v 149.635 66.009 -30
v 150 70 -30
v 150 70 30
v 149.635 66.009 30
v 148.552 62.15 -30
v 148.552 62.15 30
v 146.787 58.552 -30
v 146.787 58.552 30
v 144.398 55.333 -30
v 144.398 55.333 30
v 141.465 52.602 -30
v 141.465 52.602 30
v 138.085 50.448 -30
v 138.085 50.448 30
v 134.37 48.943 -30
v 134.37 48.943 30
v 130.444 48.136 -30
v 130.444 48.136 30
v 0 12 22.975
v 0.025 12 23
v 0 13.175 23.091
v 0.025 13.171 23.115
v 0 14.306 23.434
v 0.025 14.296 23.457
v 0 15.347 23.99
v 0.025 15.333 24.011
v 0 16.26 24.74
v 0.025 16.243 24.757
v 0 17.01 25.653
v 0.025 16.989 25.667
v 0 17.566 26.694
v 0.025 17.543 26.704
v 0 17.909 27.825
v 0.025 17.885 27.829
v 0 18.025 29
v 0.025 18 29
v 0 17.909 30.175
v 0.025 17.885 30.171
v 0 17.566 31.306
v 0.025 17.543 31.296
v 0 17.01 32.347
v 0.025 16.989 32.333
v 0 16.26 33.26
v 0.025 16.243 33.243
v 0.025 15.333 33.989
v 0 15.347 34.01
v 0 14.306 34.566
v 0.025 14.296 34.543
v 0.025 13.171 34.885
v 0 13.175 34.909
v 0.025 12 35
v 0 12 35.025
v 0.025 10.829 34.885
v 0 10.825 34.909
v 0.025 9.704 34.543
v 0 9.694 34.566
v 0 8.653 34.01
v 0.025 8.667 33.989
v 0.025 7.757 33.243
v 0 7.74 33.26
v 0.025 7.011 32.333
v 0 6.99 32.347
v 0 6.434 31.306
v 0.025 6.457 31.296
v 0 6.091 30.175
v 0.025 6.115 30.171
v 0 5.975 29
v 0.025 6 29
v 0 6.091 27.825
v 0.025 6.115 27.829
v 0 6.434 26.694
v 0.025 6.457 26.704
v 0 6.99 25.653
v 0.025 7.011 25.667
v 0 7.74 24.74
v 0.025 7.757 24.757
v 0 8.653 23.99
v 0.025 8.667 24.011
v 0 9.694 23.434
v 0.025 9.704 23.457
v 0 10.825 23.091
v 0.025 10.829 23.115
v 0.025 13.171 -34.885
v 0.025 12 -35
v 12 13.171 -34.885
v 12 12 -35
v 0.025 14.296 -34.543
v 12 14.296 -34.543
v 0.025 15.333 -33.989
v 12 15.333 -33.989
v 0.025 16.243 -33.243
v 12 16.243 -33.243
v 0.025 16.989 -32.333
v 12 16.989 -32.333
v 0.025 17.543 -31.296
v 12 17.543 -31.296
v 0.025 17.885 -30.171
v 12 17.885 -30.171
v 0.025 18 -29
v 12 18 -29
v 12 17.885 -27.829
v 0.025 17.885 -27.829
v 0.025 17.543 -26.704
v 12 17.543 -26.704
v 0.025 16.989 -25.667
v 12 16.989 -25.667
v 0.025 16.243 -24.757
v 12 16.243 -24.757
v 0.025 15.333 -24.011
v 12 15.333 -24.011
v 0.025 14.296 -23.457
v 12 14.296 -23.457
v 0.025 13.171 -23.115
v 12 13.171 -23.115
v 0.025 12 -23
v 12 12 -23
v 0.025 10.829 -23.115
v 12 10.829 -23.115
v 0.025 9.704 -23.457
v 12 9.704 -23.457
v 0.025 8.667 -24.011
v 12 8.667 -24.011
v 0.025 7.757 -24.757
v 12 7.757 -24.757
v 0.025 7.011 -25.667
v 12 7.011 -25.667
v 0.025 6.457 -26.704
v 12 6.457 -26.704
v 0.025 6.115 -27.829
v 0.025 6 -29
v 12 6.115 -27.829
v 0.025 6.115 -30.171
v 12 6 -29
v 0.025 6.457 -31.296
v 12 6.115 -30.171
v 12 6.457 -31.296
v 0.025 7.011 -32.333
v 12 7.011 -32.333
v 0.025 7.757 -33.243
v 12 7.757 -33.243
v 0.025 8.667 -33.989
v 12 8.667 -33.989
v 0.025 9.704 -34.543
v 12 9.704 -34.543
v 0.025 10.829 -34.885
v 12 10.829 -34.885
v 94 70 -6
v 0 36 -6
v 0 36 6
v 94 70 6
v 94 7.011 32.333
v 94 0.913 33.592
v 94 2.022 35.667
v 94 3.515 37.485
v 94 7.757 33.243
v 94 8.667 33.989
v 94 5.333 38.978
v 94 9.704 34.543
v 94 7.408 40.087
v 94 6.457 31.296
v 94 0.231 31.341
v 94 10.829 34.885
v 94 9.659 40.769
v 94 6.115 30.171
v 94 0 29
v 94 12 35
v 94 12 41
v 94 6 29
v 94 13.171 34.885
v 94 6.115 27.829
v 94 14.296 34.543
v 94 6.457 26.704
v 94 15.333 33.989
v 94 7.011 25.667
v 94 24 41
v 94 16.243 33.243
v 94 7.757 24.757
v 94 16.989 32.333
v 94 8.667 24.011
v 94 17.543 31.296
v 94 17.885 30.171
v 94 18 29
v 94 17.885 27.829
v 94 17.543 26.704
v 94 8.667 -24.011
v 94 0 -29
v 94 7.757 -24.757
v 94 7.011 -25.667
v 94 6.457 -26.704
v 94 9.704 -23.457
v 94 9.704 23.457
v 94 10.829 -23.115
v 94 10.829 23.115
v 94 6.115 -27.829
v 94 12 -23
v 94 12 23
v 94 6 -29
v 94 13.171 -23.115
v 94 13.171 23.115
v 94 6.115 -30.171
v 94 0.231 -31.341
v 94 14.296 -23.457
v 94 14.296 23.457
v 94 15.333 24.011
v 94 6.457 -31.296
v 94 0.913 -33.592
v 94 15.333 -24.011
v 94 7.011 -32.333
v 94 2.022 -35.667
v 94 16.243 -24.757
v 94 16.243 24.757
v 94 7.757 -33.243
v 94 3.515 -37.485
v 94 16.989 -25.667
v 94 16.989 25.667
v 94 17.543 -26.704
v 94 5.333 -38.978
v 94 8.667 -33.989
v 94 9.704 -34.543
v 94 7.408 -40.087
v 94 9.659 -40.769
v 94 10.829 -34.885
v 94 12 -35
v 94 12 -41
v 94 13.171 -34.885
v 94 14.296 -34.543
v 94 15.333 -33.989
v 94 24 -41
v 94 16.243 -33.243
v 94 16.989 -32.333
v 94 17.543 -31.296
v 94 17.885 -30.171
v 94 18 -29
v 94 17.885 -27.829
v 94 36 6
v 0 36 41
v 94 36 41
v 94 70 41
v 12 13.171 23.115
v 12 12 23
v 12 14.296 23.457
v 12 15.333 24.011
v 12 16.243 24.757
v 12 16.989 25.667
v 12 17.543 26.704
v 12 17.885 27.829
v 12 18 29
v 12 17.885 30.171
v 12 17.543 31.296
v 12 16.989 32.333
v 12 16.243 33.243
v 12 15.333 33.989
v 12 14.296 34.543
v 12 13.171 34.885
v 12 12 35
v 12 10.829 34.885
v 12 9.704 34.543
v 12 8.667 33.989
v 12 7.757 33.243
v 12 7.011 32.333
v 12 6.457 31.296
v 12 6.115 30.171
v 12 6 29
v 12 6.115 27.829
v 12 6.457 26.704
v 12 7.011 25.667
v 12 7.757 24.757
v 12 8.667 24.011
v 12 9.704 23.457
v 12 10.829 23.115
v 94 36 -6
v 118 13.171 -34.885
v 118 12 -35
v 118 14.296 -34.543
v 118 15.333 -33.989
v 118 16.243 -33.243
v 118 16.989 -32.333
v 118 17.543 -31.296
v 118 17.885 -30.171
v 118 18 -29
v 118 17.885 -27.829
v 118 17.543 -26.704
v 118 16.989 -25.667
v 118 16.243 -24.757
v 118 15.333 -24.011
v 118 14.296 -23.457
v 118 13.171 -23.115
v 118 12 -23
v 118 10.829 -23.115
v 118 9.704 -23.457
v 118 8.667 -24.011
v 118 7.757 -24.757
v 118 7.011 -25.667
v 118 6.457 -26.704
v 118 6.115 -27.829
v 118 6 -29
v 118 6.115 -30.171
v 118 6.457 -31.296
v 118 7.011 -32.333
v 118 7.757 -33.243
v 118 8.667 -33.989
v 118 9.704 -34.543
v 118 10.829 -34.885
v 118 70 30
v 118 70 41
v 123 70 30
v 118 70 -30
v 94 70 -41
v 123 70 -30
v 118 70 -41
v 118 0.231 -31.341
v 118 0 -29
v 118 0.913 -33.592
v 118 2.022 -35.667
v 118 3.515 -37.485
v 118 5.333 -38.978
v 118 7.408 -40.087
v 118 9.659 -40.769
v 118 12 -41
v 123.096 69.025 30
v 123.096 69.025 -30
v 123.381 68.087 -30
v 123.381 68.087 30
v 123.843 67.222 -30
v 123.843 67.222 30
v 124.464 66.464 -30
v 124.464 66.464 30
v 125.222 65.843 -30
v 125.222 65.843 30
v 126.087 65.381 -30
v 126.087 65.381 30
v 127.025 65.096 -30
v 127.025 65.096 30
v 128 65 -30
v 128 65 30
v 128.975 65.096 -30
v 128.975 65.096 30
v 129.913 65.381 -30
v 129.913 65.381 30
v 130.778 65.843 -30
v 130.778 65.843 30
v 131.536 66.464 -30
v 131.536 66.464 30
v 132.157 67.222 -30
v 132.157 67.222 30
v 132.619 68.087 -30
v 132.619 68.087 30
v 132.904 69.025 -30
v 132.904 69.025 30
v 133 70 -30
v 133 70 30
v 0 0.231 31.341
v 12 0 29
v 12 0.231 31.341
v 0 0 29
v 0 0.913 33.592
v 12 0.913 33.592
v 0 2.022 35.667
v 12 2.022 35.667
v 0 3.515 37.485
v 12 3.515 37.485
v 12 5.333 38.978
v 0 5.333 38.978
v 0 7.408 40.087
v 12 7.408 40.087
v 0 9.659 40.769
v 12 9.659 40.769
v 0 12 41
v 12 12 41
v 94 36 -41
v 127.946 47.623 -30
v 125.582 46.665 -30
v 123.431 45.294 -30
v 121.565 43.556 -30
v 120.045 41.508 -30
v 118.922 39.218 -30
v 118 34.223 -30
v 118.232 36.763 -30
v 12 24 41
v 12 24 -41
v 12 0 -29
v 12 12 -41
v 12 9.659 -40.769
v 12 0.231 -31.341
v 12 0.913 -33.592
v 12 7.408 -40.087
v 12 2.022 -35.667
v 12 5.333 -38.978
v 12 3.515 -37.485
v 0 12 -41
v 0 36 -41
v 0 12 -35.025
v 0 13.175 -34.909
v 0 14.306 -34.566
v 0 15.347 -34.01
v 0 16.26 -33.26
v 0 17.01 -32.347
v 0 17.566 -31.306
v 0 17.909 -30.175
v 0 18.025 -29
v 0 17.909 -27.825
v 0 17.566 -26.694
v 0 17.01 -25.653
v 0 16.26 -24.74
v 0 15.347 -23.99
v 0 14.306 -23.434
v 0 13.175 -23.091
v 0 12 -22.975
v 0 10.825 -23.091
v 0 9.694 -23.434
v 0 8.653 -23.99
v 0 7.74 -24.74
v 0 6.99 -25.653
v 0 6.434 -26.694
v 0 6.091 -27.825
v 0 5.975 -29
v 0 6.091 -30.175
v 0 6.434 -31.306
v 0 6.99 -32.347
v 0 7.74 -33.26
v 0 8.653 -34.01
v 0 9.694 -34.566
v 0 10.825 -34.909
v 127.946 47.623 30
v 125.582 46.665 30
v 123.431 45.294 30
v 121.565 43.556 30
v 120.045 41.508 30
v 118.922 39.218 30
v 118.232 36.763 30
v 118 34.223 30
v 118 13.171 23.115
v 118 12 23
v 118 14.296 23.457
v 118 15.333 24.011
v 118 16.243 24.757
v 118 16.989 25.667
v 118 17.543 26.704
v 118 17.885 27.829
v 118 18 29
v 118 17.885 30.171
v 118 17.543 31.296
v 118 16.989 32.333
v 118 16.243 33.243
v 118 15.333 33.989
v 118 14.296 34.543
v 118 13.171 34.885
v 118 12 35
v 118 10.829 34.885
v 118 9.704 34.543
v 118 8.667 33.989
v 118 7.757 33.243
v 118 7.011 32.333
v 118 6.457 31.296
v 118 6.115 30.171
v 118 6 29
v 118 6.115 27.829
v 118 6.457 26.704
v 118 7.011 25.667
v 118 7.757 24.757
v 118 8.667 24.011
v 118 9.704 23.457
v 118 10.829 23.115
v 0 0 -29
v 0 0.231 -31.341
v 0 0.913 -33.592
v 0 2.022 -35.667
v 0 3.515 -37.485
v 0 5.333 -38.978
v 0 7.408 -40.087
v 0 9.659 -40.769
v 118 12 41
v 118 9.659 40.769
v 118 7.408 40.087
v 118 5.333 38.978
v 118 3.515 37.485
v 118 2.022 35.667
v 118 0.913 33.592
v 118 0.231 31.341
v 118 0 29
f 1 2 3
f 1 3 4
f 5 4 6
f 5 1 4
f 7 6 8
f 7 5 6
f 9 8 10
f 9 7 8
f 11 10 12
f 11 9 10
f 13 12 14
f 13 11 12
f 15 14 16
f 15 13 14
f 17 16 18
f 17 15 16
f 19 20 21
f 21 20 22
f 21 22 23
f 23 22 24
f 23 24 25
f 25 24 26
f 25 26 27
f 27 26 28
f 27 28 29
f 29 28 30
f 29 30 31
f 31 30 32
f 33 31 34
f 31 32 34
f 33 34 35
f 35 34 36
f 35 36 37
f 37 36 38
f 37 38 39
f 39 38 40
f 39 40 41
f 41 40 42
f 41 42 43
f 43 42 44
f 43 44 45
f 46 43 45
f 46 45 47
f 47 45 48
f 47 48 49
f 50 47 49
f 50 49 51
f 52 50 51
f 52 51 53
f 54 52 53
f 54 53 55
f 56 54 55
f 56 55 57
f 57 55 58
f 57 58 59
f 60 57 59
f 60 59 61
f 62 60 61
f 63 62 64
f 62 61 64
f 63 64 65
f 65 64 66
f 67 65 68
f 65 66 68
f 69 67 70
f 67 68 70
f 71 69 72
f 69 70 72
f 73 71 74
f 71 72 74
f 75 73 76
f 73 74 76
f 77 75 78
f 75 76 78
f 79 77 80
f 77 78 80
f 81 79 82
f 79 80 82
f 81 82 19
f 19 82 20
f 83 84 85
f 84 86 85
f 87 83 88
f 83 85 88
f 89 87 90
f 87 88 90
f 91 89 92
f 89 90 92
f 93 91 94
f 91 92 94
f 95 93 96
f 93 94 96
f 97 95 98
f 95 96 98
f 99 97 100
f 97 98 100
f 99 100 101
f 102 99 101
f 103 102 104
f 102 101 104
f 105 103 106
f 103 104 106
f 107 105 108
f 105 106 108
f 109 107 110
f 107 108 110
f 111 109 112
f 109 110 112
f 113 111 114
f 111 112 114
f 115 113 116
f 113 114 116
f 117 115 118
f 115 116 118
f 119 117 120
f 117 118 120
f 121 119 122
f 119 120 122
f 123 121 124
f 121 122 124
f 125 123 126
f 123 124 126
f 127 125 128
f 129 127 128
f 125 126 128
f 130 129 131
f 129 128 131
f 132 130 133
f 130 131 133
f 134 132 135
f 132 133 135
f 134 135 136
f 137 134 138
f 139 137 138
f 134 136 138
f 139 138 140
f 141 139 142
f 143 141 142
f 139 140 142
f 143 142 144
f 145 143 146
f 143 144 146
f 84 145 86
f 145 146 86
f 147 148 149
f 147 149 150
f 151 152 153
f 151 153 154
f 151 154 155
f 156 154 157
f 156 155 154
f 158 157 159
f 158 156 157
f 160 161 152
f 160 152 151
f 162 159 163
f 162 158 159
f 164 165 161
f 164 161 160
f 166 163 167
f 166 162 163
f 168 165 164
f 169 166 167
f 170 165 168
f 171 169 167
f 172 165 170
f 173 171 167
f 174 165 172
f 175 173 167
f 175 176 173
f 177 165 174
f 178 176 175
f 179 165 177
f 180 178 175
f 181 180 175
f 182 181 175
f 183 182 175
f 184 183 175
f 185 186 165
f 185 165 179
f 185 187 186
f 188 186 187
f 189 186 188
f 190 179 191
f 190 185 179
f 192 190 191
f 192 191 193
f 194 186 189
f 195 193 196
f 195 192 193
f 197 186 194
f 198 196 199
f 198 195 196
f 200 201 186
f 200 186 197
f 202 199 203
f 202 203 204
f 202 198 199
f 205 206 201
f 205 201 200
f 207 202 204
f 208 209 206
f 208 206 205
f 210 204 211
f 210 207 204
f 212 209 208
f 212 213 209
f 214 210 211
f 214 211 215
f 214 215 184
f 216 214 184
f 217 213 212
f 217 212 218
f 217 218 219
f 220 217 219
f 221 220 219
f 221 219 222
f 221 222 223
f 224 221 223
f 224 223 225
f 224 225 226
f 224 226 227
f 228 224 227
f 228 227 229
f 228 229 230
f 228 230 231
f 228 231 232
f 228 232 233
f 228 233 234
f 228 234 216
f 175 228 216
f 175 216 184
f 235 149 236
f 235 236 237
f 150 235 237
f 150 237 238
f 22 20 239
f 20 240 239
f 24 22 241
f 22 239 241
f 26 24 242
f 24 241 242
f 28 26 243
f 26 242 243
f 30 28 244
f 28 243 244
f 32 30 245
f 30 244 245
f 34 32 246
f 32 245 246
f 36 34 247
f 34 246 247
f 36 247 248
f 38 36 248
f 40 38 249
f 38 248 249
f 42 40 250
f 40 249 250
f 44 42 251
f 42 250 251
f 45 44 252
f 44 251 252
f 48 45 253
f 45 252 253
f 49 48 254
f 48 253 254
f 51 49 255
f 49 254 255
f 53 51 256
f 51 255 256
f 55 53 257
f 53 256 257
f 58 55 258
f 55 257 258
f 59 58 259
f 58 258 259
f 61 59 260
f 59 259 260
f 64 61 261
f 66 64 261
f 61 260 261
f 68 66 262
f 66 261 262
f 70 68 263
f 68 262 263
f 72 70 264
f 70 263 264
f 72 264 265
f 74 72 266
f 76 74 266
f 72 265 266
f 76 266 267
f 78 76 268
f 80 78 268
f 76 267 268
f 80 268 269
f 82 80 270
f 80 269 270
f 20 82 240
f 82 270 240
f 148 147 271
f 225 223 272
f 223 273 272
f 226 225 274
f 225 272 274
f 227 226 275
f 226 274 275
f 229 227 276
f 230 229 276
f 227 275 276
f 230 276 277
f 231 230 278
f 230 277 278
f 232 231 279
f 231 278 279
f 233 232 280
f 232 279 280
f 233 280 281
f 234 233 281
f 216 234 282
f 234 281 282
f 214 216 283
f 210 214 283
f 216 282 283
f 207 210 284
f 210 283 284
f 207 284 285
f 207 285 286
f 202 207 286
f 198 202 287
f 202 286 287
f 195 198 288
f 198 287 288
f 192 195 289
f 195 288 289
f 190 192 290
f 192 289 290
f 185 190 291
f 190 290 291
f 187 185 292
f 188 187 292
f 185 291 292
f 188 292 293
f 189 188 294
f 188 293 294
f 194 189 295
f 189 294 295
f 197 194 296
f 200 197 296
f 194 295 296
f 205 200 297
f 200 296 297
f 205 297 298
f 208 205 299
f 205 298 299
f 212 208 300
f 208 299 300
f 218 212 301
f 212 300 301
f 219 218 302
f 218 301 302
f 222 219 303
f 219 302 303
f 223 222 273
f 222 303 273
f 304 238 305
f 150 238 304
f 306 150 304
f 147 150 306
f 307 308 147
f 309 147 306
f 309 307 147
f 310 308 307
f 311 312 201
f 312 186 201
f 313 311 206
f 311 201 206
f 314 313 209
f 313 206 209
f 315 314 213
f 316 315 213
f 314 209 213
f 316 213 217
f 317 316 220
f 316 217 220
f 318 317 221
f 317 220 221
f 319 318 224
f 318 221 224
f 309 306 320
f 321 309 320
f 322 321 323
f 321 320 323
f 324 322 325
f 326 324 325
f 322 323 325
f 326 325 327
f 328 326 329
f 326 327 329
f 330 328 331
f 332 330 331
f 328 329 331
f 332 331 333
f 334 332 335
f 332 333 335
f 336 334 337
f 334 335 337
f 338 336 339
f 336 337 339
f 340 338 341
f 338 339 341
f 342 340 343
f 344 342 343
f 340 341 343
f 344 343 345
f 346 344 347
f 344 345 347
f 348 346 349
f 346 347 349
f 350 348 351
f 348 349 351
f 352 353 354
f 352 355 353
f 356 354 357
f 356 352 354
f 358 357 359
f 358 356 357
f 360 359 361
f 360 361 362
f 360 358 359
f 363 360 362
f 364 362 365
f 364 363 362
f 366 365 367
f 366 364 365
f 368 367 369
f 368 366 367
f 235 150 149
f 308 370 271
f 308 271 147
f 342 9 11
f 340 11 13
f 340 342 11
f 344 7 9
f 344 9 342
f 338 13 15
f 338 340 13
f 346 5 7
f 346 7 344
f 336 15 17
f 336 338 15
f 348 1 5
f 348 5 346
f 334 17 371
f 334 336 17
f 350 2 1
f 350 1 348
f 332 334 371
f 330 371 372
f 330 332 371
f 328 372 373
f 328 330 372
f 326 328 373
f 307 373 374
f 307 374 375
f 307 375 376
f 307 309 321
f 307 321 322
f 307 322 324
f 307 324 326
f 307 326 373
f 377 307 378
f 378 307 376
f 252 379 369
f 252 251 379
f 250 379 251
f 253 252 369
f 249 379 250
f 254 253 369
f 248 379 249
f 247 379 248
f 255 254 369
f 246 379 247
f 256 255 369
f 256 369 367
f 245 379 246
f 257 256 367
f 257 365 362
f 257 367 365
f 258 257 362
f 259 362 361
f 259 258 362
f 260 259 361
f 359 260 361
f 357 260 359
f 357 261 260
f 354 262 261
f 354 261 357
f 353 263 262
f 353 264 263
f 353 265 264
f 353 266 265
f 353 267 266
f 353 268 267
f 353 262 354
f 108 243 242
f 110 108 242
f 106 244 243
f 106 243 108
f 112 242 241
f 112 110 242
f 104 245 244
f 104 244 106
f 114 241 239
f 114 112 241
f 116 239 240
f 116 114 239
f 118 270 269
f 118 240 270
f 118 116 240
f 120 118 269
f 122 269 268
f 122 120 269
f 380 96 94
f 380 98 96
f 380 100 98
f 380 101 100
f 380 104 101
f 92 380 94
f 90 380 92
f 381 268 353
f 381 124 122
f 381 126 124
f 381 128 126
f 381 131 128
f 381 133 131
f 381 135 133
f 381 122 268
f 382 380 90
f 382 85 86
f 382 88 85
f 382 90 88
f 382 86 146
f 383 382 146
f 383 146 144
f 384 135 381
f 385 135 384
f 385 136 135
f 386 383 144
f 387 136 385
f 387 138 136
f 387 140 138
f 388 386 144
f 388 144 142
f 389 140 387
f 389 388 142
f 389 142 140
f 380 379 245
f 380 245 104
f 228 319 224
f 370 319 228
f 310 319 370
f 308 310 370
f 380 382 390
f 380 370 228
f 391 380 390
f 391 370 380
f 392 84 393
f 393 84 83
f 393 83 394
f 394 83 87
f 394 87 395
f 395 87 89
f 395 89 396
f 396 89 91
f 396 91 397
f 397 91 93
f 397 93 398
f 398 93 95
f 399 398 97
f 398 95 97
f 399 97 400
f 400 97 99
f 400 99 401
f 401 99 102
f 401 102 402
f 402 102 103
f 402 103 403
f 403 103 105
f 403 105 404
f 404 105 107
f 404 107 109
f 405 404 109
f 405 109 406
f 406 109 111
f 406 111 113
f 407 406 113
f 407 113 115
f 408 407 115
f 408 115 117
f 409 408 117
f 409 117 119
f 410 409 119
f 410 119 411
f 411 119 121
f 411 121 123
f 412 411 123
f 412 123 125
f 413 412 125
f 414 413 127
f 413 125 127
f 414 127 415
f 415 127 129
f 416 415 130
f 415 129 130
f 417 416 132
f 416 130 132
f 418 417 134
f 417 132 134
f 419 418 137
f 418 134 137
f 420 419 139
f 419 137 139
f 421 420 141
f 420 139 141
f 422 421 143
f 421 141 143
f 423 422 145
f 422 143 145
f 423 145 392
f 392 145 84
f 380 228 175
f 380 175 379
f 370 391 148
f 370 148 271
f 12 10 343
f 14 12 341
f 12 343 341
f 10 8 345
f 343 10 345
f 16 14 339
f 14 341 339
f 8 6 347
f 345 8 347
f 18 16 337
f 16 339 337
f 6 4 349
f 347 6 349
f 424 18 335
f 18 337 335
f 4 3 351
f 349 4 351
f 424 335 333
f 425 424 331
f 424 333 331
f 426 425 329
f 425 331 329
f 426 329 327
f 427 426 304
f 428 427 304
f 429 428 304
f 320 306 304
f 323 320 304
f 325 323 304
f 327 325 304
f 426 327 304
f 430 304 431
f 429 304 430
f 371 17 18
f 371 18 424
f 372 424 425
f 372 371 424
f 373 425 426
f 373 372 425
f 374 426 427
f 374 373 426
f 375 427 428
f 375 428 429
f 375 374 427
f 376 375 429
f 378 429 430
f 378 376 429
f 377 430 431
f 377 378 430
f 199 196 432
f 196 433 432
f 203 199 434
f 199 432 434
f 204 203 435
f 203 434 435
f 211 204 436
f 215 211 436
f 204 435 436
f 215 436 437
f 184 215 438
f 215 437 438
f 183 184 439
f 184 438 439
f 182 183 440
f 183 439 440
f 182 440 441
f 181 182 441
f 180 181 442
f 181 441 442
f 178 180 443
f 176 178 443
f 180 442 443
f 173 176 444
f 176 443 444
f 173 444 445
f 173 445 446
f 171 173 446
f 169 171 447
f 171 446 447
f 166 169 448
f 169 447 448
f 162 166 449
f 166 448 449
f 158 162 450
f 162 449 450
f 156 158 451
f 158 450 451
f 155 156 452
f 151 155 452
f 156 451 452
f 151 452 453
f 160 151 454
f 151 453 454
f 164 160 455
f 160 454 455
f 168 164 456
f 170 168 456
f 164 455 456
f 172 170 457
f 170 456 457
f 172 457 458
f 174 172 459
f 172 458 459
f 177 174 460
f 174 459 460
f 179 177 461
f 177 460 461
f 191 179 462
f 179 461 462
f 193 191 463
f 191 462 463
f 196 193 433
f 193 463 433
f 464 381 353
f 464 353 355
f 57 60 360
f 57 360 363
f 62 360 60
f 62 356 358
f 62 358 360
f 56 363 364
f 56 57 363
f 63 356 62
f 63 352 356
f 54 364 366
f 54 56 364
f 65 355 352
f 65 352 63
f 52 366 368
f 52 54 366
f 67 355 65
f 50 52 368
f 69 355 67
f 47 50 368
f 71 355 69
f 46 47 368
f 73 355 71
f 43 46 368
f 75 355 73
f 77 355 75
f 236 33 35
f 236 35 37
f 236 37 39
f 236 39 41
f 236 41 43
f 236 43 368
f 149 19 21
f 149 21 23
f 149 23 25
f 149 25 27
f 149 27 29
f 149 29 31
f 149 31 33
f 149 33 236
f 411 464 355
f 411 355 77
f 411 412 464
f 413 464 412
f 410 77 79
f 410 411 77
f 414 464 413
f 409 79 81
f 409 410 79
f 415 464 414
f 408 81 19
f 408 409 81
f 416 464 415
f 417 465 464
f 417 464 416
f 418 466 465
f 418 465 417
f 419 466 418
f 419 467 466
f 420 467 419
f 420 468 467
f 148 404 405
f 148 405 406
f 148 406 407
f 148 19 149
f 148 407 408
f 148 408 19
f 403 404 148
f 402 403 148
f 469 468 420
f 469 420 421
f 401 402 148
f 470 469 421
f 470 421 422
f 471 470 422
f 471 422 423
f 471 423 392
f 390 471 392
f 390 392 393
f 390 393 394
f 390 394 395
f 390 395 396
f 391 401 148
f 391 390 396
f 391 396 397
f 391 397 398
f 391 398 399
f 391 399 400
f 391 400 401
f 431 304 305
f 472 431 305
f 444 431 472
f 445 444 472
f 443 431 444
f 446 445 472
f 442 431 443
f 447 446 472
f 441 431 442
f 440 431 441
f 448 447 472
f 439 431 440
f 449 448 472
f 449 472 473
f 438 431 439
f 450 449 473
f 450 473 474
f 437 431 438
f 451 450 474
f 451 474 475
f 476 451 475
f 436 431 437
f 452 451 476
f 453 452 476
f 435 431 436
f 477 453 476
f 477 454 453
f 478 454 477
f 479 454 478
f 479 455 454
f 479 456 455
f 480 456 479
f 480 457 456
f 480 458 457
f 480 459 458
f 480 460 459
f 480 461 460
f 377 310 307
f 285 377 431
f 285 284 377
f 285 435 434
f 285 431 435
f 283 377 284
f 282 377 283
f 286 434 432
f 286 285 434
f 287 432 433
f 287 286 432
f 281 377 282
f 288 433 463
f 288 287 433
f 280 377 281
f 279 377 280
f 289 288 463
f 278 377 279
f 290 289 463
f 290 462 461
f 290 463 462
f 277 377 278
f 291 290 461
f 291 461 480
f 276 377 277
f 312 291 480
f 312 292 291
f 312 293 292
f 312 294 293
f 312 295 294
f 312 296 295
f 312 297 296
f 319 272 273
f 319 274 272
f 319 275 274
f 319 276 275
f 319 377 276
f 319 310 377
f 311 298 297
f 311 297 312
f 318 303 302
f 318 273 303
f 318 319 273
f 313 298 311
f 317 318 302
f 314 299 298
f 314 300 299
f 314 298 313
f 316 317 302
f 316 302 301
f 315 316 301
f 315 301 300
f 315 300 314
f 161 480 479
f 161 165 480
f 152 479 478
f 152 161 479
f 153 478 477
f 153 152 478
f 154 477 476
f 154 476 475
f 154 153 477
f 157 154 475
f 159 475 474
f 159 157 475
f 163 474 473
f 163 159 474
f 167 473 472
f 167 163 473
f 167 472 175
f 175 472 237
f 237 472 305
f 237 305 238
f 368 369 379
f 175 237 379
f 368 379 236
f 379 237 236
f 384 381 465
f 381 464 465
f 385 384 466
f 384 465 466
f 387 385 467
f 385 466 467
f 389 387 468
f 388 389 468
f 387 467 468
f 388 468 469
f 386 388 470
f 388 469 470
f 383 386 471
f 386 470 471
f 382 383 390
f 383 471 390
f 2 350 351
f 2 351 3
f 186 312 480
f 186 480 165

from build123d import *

# Parameters (mm, degrees)
BOSS_EXTRUDE1_DEPTH              = 41
BOSS_EXTRUDE1_DEPTH_BACK         = 41
FILLET1_R                        = 12
F_12_0MM_DOWEL_HOLE1_D           = 12
F_12_0MM_DOWEL_HOLE1_CSINK_D     = 12.05
F_12_0MM_DOWEL_HOLE1_CSINK_ANGLE = 90
BOSS_EXTRUDE2_DEPTH              = 30
BOSS_EXTRUDE2_DEPTH_BACK         = 30
SKETCH8_R                        = 5
CUT_EXTRUDE1_DEPTH               = 181.113852882
BOSS_EXTRUDE3_DEPTH              = 6
BOSS_EXTRUDE3_DEPTH_BACK         = 6


with BuildPart() as part:
    # Sketch1 → Boss-Extrude1 (new, two sides: drawn at the far end of the back side and taken through both)
    with BuildSketch(Plane.XY.offset(-BOSS_EXTRUDE1_DEPTH_BACK)):
        Polygon((0, 0), (0, 36), (94, 36), (94, 70), (118, 70), (118, 0), (94, 0), (94, 24), (12, 24), (12, 0), align=None)
    extrude(amount=BOSS_EXTRUDE1_DEPTH + BOSS_EXTRUDE1_DEPTH_BACK)

    # Fillet1
    fillet1_edges = [part.edges().sort_by_distance(p)[0] for p in [
        (106, 0, -41),
        (6, 0, 41),
        (106, 0, 41),
        (6, 0, -41),
    ]]
    fillet(fillet1_edges, radius=FILLET1_R)

    # Ø12.0mm Dowel Hole1 (through all)
    with Locations(Plane.ZY):
        with Locations((-29, 12), (29, 12)):
            CounterSinkHole(F_12_0MM_DOWEL_HOLE1_D / 2, F_12_0MM_DOWEL_HOLE1_CSINK_D / 2, counter_sink_angle=F_12_0MM_DOWEL_HOLE1_CSINK_ANGLE)

    # Sketch7 → Boss-Extrude2 (add, two sides: drawn at the far end of the back side and taken through both)
    with BuildSketch(Plane.XY.offset(-BOSS_EXTRUDE2_DEPTH_BACK)):
        with BuildLine():
            Line((118, 34.22291236), (118, 70))
            Line((118, 70), (128, 70))
            Line((128, 70), (150, 70))
            ThreePointArc((150, 70), (144.397831835, 55.333333333), (130.444444444, 48.13622422))
            ThreePointArc((130.444444444, 48.13622422), (121.565016105, 43.556245693), (118, 34.22291236))
        make_face()
    extrude(amount=BOSS_EXTRUDE2_DEPTH + BOSS_EXTRUDE2_DEPTH_BACK)

    # Sketch8 → Cut-Extrude1 (cut, through all)
    with BuildSketch(Plane.XY.offset(30)):
        with Locations((128, 70)):
            Circle(SKETCH8_R)
    extrude(amount=-CUT_EXTRUDE1_DEPTH, mode=Mode.SUBTRACT)

    # Sketch9 → Boss-Extrude3 (add, two sides: drawn at the far end of the back side and taken through both)
    with BuildSketch(Plane.XY.offset(-BOSS_EXTRUDE3_DEPTH_BACK)):
        Polygon((0, 36), (94, 70), (94, 36), align=None)
    extrude(amount=BOSS_EXTRUDE3_DEPTH + BOSS_EXTRUDE3_DEPTH_BACK)


solid = part.part
